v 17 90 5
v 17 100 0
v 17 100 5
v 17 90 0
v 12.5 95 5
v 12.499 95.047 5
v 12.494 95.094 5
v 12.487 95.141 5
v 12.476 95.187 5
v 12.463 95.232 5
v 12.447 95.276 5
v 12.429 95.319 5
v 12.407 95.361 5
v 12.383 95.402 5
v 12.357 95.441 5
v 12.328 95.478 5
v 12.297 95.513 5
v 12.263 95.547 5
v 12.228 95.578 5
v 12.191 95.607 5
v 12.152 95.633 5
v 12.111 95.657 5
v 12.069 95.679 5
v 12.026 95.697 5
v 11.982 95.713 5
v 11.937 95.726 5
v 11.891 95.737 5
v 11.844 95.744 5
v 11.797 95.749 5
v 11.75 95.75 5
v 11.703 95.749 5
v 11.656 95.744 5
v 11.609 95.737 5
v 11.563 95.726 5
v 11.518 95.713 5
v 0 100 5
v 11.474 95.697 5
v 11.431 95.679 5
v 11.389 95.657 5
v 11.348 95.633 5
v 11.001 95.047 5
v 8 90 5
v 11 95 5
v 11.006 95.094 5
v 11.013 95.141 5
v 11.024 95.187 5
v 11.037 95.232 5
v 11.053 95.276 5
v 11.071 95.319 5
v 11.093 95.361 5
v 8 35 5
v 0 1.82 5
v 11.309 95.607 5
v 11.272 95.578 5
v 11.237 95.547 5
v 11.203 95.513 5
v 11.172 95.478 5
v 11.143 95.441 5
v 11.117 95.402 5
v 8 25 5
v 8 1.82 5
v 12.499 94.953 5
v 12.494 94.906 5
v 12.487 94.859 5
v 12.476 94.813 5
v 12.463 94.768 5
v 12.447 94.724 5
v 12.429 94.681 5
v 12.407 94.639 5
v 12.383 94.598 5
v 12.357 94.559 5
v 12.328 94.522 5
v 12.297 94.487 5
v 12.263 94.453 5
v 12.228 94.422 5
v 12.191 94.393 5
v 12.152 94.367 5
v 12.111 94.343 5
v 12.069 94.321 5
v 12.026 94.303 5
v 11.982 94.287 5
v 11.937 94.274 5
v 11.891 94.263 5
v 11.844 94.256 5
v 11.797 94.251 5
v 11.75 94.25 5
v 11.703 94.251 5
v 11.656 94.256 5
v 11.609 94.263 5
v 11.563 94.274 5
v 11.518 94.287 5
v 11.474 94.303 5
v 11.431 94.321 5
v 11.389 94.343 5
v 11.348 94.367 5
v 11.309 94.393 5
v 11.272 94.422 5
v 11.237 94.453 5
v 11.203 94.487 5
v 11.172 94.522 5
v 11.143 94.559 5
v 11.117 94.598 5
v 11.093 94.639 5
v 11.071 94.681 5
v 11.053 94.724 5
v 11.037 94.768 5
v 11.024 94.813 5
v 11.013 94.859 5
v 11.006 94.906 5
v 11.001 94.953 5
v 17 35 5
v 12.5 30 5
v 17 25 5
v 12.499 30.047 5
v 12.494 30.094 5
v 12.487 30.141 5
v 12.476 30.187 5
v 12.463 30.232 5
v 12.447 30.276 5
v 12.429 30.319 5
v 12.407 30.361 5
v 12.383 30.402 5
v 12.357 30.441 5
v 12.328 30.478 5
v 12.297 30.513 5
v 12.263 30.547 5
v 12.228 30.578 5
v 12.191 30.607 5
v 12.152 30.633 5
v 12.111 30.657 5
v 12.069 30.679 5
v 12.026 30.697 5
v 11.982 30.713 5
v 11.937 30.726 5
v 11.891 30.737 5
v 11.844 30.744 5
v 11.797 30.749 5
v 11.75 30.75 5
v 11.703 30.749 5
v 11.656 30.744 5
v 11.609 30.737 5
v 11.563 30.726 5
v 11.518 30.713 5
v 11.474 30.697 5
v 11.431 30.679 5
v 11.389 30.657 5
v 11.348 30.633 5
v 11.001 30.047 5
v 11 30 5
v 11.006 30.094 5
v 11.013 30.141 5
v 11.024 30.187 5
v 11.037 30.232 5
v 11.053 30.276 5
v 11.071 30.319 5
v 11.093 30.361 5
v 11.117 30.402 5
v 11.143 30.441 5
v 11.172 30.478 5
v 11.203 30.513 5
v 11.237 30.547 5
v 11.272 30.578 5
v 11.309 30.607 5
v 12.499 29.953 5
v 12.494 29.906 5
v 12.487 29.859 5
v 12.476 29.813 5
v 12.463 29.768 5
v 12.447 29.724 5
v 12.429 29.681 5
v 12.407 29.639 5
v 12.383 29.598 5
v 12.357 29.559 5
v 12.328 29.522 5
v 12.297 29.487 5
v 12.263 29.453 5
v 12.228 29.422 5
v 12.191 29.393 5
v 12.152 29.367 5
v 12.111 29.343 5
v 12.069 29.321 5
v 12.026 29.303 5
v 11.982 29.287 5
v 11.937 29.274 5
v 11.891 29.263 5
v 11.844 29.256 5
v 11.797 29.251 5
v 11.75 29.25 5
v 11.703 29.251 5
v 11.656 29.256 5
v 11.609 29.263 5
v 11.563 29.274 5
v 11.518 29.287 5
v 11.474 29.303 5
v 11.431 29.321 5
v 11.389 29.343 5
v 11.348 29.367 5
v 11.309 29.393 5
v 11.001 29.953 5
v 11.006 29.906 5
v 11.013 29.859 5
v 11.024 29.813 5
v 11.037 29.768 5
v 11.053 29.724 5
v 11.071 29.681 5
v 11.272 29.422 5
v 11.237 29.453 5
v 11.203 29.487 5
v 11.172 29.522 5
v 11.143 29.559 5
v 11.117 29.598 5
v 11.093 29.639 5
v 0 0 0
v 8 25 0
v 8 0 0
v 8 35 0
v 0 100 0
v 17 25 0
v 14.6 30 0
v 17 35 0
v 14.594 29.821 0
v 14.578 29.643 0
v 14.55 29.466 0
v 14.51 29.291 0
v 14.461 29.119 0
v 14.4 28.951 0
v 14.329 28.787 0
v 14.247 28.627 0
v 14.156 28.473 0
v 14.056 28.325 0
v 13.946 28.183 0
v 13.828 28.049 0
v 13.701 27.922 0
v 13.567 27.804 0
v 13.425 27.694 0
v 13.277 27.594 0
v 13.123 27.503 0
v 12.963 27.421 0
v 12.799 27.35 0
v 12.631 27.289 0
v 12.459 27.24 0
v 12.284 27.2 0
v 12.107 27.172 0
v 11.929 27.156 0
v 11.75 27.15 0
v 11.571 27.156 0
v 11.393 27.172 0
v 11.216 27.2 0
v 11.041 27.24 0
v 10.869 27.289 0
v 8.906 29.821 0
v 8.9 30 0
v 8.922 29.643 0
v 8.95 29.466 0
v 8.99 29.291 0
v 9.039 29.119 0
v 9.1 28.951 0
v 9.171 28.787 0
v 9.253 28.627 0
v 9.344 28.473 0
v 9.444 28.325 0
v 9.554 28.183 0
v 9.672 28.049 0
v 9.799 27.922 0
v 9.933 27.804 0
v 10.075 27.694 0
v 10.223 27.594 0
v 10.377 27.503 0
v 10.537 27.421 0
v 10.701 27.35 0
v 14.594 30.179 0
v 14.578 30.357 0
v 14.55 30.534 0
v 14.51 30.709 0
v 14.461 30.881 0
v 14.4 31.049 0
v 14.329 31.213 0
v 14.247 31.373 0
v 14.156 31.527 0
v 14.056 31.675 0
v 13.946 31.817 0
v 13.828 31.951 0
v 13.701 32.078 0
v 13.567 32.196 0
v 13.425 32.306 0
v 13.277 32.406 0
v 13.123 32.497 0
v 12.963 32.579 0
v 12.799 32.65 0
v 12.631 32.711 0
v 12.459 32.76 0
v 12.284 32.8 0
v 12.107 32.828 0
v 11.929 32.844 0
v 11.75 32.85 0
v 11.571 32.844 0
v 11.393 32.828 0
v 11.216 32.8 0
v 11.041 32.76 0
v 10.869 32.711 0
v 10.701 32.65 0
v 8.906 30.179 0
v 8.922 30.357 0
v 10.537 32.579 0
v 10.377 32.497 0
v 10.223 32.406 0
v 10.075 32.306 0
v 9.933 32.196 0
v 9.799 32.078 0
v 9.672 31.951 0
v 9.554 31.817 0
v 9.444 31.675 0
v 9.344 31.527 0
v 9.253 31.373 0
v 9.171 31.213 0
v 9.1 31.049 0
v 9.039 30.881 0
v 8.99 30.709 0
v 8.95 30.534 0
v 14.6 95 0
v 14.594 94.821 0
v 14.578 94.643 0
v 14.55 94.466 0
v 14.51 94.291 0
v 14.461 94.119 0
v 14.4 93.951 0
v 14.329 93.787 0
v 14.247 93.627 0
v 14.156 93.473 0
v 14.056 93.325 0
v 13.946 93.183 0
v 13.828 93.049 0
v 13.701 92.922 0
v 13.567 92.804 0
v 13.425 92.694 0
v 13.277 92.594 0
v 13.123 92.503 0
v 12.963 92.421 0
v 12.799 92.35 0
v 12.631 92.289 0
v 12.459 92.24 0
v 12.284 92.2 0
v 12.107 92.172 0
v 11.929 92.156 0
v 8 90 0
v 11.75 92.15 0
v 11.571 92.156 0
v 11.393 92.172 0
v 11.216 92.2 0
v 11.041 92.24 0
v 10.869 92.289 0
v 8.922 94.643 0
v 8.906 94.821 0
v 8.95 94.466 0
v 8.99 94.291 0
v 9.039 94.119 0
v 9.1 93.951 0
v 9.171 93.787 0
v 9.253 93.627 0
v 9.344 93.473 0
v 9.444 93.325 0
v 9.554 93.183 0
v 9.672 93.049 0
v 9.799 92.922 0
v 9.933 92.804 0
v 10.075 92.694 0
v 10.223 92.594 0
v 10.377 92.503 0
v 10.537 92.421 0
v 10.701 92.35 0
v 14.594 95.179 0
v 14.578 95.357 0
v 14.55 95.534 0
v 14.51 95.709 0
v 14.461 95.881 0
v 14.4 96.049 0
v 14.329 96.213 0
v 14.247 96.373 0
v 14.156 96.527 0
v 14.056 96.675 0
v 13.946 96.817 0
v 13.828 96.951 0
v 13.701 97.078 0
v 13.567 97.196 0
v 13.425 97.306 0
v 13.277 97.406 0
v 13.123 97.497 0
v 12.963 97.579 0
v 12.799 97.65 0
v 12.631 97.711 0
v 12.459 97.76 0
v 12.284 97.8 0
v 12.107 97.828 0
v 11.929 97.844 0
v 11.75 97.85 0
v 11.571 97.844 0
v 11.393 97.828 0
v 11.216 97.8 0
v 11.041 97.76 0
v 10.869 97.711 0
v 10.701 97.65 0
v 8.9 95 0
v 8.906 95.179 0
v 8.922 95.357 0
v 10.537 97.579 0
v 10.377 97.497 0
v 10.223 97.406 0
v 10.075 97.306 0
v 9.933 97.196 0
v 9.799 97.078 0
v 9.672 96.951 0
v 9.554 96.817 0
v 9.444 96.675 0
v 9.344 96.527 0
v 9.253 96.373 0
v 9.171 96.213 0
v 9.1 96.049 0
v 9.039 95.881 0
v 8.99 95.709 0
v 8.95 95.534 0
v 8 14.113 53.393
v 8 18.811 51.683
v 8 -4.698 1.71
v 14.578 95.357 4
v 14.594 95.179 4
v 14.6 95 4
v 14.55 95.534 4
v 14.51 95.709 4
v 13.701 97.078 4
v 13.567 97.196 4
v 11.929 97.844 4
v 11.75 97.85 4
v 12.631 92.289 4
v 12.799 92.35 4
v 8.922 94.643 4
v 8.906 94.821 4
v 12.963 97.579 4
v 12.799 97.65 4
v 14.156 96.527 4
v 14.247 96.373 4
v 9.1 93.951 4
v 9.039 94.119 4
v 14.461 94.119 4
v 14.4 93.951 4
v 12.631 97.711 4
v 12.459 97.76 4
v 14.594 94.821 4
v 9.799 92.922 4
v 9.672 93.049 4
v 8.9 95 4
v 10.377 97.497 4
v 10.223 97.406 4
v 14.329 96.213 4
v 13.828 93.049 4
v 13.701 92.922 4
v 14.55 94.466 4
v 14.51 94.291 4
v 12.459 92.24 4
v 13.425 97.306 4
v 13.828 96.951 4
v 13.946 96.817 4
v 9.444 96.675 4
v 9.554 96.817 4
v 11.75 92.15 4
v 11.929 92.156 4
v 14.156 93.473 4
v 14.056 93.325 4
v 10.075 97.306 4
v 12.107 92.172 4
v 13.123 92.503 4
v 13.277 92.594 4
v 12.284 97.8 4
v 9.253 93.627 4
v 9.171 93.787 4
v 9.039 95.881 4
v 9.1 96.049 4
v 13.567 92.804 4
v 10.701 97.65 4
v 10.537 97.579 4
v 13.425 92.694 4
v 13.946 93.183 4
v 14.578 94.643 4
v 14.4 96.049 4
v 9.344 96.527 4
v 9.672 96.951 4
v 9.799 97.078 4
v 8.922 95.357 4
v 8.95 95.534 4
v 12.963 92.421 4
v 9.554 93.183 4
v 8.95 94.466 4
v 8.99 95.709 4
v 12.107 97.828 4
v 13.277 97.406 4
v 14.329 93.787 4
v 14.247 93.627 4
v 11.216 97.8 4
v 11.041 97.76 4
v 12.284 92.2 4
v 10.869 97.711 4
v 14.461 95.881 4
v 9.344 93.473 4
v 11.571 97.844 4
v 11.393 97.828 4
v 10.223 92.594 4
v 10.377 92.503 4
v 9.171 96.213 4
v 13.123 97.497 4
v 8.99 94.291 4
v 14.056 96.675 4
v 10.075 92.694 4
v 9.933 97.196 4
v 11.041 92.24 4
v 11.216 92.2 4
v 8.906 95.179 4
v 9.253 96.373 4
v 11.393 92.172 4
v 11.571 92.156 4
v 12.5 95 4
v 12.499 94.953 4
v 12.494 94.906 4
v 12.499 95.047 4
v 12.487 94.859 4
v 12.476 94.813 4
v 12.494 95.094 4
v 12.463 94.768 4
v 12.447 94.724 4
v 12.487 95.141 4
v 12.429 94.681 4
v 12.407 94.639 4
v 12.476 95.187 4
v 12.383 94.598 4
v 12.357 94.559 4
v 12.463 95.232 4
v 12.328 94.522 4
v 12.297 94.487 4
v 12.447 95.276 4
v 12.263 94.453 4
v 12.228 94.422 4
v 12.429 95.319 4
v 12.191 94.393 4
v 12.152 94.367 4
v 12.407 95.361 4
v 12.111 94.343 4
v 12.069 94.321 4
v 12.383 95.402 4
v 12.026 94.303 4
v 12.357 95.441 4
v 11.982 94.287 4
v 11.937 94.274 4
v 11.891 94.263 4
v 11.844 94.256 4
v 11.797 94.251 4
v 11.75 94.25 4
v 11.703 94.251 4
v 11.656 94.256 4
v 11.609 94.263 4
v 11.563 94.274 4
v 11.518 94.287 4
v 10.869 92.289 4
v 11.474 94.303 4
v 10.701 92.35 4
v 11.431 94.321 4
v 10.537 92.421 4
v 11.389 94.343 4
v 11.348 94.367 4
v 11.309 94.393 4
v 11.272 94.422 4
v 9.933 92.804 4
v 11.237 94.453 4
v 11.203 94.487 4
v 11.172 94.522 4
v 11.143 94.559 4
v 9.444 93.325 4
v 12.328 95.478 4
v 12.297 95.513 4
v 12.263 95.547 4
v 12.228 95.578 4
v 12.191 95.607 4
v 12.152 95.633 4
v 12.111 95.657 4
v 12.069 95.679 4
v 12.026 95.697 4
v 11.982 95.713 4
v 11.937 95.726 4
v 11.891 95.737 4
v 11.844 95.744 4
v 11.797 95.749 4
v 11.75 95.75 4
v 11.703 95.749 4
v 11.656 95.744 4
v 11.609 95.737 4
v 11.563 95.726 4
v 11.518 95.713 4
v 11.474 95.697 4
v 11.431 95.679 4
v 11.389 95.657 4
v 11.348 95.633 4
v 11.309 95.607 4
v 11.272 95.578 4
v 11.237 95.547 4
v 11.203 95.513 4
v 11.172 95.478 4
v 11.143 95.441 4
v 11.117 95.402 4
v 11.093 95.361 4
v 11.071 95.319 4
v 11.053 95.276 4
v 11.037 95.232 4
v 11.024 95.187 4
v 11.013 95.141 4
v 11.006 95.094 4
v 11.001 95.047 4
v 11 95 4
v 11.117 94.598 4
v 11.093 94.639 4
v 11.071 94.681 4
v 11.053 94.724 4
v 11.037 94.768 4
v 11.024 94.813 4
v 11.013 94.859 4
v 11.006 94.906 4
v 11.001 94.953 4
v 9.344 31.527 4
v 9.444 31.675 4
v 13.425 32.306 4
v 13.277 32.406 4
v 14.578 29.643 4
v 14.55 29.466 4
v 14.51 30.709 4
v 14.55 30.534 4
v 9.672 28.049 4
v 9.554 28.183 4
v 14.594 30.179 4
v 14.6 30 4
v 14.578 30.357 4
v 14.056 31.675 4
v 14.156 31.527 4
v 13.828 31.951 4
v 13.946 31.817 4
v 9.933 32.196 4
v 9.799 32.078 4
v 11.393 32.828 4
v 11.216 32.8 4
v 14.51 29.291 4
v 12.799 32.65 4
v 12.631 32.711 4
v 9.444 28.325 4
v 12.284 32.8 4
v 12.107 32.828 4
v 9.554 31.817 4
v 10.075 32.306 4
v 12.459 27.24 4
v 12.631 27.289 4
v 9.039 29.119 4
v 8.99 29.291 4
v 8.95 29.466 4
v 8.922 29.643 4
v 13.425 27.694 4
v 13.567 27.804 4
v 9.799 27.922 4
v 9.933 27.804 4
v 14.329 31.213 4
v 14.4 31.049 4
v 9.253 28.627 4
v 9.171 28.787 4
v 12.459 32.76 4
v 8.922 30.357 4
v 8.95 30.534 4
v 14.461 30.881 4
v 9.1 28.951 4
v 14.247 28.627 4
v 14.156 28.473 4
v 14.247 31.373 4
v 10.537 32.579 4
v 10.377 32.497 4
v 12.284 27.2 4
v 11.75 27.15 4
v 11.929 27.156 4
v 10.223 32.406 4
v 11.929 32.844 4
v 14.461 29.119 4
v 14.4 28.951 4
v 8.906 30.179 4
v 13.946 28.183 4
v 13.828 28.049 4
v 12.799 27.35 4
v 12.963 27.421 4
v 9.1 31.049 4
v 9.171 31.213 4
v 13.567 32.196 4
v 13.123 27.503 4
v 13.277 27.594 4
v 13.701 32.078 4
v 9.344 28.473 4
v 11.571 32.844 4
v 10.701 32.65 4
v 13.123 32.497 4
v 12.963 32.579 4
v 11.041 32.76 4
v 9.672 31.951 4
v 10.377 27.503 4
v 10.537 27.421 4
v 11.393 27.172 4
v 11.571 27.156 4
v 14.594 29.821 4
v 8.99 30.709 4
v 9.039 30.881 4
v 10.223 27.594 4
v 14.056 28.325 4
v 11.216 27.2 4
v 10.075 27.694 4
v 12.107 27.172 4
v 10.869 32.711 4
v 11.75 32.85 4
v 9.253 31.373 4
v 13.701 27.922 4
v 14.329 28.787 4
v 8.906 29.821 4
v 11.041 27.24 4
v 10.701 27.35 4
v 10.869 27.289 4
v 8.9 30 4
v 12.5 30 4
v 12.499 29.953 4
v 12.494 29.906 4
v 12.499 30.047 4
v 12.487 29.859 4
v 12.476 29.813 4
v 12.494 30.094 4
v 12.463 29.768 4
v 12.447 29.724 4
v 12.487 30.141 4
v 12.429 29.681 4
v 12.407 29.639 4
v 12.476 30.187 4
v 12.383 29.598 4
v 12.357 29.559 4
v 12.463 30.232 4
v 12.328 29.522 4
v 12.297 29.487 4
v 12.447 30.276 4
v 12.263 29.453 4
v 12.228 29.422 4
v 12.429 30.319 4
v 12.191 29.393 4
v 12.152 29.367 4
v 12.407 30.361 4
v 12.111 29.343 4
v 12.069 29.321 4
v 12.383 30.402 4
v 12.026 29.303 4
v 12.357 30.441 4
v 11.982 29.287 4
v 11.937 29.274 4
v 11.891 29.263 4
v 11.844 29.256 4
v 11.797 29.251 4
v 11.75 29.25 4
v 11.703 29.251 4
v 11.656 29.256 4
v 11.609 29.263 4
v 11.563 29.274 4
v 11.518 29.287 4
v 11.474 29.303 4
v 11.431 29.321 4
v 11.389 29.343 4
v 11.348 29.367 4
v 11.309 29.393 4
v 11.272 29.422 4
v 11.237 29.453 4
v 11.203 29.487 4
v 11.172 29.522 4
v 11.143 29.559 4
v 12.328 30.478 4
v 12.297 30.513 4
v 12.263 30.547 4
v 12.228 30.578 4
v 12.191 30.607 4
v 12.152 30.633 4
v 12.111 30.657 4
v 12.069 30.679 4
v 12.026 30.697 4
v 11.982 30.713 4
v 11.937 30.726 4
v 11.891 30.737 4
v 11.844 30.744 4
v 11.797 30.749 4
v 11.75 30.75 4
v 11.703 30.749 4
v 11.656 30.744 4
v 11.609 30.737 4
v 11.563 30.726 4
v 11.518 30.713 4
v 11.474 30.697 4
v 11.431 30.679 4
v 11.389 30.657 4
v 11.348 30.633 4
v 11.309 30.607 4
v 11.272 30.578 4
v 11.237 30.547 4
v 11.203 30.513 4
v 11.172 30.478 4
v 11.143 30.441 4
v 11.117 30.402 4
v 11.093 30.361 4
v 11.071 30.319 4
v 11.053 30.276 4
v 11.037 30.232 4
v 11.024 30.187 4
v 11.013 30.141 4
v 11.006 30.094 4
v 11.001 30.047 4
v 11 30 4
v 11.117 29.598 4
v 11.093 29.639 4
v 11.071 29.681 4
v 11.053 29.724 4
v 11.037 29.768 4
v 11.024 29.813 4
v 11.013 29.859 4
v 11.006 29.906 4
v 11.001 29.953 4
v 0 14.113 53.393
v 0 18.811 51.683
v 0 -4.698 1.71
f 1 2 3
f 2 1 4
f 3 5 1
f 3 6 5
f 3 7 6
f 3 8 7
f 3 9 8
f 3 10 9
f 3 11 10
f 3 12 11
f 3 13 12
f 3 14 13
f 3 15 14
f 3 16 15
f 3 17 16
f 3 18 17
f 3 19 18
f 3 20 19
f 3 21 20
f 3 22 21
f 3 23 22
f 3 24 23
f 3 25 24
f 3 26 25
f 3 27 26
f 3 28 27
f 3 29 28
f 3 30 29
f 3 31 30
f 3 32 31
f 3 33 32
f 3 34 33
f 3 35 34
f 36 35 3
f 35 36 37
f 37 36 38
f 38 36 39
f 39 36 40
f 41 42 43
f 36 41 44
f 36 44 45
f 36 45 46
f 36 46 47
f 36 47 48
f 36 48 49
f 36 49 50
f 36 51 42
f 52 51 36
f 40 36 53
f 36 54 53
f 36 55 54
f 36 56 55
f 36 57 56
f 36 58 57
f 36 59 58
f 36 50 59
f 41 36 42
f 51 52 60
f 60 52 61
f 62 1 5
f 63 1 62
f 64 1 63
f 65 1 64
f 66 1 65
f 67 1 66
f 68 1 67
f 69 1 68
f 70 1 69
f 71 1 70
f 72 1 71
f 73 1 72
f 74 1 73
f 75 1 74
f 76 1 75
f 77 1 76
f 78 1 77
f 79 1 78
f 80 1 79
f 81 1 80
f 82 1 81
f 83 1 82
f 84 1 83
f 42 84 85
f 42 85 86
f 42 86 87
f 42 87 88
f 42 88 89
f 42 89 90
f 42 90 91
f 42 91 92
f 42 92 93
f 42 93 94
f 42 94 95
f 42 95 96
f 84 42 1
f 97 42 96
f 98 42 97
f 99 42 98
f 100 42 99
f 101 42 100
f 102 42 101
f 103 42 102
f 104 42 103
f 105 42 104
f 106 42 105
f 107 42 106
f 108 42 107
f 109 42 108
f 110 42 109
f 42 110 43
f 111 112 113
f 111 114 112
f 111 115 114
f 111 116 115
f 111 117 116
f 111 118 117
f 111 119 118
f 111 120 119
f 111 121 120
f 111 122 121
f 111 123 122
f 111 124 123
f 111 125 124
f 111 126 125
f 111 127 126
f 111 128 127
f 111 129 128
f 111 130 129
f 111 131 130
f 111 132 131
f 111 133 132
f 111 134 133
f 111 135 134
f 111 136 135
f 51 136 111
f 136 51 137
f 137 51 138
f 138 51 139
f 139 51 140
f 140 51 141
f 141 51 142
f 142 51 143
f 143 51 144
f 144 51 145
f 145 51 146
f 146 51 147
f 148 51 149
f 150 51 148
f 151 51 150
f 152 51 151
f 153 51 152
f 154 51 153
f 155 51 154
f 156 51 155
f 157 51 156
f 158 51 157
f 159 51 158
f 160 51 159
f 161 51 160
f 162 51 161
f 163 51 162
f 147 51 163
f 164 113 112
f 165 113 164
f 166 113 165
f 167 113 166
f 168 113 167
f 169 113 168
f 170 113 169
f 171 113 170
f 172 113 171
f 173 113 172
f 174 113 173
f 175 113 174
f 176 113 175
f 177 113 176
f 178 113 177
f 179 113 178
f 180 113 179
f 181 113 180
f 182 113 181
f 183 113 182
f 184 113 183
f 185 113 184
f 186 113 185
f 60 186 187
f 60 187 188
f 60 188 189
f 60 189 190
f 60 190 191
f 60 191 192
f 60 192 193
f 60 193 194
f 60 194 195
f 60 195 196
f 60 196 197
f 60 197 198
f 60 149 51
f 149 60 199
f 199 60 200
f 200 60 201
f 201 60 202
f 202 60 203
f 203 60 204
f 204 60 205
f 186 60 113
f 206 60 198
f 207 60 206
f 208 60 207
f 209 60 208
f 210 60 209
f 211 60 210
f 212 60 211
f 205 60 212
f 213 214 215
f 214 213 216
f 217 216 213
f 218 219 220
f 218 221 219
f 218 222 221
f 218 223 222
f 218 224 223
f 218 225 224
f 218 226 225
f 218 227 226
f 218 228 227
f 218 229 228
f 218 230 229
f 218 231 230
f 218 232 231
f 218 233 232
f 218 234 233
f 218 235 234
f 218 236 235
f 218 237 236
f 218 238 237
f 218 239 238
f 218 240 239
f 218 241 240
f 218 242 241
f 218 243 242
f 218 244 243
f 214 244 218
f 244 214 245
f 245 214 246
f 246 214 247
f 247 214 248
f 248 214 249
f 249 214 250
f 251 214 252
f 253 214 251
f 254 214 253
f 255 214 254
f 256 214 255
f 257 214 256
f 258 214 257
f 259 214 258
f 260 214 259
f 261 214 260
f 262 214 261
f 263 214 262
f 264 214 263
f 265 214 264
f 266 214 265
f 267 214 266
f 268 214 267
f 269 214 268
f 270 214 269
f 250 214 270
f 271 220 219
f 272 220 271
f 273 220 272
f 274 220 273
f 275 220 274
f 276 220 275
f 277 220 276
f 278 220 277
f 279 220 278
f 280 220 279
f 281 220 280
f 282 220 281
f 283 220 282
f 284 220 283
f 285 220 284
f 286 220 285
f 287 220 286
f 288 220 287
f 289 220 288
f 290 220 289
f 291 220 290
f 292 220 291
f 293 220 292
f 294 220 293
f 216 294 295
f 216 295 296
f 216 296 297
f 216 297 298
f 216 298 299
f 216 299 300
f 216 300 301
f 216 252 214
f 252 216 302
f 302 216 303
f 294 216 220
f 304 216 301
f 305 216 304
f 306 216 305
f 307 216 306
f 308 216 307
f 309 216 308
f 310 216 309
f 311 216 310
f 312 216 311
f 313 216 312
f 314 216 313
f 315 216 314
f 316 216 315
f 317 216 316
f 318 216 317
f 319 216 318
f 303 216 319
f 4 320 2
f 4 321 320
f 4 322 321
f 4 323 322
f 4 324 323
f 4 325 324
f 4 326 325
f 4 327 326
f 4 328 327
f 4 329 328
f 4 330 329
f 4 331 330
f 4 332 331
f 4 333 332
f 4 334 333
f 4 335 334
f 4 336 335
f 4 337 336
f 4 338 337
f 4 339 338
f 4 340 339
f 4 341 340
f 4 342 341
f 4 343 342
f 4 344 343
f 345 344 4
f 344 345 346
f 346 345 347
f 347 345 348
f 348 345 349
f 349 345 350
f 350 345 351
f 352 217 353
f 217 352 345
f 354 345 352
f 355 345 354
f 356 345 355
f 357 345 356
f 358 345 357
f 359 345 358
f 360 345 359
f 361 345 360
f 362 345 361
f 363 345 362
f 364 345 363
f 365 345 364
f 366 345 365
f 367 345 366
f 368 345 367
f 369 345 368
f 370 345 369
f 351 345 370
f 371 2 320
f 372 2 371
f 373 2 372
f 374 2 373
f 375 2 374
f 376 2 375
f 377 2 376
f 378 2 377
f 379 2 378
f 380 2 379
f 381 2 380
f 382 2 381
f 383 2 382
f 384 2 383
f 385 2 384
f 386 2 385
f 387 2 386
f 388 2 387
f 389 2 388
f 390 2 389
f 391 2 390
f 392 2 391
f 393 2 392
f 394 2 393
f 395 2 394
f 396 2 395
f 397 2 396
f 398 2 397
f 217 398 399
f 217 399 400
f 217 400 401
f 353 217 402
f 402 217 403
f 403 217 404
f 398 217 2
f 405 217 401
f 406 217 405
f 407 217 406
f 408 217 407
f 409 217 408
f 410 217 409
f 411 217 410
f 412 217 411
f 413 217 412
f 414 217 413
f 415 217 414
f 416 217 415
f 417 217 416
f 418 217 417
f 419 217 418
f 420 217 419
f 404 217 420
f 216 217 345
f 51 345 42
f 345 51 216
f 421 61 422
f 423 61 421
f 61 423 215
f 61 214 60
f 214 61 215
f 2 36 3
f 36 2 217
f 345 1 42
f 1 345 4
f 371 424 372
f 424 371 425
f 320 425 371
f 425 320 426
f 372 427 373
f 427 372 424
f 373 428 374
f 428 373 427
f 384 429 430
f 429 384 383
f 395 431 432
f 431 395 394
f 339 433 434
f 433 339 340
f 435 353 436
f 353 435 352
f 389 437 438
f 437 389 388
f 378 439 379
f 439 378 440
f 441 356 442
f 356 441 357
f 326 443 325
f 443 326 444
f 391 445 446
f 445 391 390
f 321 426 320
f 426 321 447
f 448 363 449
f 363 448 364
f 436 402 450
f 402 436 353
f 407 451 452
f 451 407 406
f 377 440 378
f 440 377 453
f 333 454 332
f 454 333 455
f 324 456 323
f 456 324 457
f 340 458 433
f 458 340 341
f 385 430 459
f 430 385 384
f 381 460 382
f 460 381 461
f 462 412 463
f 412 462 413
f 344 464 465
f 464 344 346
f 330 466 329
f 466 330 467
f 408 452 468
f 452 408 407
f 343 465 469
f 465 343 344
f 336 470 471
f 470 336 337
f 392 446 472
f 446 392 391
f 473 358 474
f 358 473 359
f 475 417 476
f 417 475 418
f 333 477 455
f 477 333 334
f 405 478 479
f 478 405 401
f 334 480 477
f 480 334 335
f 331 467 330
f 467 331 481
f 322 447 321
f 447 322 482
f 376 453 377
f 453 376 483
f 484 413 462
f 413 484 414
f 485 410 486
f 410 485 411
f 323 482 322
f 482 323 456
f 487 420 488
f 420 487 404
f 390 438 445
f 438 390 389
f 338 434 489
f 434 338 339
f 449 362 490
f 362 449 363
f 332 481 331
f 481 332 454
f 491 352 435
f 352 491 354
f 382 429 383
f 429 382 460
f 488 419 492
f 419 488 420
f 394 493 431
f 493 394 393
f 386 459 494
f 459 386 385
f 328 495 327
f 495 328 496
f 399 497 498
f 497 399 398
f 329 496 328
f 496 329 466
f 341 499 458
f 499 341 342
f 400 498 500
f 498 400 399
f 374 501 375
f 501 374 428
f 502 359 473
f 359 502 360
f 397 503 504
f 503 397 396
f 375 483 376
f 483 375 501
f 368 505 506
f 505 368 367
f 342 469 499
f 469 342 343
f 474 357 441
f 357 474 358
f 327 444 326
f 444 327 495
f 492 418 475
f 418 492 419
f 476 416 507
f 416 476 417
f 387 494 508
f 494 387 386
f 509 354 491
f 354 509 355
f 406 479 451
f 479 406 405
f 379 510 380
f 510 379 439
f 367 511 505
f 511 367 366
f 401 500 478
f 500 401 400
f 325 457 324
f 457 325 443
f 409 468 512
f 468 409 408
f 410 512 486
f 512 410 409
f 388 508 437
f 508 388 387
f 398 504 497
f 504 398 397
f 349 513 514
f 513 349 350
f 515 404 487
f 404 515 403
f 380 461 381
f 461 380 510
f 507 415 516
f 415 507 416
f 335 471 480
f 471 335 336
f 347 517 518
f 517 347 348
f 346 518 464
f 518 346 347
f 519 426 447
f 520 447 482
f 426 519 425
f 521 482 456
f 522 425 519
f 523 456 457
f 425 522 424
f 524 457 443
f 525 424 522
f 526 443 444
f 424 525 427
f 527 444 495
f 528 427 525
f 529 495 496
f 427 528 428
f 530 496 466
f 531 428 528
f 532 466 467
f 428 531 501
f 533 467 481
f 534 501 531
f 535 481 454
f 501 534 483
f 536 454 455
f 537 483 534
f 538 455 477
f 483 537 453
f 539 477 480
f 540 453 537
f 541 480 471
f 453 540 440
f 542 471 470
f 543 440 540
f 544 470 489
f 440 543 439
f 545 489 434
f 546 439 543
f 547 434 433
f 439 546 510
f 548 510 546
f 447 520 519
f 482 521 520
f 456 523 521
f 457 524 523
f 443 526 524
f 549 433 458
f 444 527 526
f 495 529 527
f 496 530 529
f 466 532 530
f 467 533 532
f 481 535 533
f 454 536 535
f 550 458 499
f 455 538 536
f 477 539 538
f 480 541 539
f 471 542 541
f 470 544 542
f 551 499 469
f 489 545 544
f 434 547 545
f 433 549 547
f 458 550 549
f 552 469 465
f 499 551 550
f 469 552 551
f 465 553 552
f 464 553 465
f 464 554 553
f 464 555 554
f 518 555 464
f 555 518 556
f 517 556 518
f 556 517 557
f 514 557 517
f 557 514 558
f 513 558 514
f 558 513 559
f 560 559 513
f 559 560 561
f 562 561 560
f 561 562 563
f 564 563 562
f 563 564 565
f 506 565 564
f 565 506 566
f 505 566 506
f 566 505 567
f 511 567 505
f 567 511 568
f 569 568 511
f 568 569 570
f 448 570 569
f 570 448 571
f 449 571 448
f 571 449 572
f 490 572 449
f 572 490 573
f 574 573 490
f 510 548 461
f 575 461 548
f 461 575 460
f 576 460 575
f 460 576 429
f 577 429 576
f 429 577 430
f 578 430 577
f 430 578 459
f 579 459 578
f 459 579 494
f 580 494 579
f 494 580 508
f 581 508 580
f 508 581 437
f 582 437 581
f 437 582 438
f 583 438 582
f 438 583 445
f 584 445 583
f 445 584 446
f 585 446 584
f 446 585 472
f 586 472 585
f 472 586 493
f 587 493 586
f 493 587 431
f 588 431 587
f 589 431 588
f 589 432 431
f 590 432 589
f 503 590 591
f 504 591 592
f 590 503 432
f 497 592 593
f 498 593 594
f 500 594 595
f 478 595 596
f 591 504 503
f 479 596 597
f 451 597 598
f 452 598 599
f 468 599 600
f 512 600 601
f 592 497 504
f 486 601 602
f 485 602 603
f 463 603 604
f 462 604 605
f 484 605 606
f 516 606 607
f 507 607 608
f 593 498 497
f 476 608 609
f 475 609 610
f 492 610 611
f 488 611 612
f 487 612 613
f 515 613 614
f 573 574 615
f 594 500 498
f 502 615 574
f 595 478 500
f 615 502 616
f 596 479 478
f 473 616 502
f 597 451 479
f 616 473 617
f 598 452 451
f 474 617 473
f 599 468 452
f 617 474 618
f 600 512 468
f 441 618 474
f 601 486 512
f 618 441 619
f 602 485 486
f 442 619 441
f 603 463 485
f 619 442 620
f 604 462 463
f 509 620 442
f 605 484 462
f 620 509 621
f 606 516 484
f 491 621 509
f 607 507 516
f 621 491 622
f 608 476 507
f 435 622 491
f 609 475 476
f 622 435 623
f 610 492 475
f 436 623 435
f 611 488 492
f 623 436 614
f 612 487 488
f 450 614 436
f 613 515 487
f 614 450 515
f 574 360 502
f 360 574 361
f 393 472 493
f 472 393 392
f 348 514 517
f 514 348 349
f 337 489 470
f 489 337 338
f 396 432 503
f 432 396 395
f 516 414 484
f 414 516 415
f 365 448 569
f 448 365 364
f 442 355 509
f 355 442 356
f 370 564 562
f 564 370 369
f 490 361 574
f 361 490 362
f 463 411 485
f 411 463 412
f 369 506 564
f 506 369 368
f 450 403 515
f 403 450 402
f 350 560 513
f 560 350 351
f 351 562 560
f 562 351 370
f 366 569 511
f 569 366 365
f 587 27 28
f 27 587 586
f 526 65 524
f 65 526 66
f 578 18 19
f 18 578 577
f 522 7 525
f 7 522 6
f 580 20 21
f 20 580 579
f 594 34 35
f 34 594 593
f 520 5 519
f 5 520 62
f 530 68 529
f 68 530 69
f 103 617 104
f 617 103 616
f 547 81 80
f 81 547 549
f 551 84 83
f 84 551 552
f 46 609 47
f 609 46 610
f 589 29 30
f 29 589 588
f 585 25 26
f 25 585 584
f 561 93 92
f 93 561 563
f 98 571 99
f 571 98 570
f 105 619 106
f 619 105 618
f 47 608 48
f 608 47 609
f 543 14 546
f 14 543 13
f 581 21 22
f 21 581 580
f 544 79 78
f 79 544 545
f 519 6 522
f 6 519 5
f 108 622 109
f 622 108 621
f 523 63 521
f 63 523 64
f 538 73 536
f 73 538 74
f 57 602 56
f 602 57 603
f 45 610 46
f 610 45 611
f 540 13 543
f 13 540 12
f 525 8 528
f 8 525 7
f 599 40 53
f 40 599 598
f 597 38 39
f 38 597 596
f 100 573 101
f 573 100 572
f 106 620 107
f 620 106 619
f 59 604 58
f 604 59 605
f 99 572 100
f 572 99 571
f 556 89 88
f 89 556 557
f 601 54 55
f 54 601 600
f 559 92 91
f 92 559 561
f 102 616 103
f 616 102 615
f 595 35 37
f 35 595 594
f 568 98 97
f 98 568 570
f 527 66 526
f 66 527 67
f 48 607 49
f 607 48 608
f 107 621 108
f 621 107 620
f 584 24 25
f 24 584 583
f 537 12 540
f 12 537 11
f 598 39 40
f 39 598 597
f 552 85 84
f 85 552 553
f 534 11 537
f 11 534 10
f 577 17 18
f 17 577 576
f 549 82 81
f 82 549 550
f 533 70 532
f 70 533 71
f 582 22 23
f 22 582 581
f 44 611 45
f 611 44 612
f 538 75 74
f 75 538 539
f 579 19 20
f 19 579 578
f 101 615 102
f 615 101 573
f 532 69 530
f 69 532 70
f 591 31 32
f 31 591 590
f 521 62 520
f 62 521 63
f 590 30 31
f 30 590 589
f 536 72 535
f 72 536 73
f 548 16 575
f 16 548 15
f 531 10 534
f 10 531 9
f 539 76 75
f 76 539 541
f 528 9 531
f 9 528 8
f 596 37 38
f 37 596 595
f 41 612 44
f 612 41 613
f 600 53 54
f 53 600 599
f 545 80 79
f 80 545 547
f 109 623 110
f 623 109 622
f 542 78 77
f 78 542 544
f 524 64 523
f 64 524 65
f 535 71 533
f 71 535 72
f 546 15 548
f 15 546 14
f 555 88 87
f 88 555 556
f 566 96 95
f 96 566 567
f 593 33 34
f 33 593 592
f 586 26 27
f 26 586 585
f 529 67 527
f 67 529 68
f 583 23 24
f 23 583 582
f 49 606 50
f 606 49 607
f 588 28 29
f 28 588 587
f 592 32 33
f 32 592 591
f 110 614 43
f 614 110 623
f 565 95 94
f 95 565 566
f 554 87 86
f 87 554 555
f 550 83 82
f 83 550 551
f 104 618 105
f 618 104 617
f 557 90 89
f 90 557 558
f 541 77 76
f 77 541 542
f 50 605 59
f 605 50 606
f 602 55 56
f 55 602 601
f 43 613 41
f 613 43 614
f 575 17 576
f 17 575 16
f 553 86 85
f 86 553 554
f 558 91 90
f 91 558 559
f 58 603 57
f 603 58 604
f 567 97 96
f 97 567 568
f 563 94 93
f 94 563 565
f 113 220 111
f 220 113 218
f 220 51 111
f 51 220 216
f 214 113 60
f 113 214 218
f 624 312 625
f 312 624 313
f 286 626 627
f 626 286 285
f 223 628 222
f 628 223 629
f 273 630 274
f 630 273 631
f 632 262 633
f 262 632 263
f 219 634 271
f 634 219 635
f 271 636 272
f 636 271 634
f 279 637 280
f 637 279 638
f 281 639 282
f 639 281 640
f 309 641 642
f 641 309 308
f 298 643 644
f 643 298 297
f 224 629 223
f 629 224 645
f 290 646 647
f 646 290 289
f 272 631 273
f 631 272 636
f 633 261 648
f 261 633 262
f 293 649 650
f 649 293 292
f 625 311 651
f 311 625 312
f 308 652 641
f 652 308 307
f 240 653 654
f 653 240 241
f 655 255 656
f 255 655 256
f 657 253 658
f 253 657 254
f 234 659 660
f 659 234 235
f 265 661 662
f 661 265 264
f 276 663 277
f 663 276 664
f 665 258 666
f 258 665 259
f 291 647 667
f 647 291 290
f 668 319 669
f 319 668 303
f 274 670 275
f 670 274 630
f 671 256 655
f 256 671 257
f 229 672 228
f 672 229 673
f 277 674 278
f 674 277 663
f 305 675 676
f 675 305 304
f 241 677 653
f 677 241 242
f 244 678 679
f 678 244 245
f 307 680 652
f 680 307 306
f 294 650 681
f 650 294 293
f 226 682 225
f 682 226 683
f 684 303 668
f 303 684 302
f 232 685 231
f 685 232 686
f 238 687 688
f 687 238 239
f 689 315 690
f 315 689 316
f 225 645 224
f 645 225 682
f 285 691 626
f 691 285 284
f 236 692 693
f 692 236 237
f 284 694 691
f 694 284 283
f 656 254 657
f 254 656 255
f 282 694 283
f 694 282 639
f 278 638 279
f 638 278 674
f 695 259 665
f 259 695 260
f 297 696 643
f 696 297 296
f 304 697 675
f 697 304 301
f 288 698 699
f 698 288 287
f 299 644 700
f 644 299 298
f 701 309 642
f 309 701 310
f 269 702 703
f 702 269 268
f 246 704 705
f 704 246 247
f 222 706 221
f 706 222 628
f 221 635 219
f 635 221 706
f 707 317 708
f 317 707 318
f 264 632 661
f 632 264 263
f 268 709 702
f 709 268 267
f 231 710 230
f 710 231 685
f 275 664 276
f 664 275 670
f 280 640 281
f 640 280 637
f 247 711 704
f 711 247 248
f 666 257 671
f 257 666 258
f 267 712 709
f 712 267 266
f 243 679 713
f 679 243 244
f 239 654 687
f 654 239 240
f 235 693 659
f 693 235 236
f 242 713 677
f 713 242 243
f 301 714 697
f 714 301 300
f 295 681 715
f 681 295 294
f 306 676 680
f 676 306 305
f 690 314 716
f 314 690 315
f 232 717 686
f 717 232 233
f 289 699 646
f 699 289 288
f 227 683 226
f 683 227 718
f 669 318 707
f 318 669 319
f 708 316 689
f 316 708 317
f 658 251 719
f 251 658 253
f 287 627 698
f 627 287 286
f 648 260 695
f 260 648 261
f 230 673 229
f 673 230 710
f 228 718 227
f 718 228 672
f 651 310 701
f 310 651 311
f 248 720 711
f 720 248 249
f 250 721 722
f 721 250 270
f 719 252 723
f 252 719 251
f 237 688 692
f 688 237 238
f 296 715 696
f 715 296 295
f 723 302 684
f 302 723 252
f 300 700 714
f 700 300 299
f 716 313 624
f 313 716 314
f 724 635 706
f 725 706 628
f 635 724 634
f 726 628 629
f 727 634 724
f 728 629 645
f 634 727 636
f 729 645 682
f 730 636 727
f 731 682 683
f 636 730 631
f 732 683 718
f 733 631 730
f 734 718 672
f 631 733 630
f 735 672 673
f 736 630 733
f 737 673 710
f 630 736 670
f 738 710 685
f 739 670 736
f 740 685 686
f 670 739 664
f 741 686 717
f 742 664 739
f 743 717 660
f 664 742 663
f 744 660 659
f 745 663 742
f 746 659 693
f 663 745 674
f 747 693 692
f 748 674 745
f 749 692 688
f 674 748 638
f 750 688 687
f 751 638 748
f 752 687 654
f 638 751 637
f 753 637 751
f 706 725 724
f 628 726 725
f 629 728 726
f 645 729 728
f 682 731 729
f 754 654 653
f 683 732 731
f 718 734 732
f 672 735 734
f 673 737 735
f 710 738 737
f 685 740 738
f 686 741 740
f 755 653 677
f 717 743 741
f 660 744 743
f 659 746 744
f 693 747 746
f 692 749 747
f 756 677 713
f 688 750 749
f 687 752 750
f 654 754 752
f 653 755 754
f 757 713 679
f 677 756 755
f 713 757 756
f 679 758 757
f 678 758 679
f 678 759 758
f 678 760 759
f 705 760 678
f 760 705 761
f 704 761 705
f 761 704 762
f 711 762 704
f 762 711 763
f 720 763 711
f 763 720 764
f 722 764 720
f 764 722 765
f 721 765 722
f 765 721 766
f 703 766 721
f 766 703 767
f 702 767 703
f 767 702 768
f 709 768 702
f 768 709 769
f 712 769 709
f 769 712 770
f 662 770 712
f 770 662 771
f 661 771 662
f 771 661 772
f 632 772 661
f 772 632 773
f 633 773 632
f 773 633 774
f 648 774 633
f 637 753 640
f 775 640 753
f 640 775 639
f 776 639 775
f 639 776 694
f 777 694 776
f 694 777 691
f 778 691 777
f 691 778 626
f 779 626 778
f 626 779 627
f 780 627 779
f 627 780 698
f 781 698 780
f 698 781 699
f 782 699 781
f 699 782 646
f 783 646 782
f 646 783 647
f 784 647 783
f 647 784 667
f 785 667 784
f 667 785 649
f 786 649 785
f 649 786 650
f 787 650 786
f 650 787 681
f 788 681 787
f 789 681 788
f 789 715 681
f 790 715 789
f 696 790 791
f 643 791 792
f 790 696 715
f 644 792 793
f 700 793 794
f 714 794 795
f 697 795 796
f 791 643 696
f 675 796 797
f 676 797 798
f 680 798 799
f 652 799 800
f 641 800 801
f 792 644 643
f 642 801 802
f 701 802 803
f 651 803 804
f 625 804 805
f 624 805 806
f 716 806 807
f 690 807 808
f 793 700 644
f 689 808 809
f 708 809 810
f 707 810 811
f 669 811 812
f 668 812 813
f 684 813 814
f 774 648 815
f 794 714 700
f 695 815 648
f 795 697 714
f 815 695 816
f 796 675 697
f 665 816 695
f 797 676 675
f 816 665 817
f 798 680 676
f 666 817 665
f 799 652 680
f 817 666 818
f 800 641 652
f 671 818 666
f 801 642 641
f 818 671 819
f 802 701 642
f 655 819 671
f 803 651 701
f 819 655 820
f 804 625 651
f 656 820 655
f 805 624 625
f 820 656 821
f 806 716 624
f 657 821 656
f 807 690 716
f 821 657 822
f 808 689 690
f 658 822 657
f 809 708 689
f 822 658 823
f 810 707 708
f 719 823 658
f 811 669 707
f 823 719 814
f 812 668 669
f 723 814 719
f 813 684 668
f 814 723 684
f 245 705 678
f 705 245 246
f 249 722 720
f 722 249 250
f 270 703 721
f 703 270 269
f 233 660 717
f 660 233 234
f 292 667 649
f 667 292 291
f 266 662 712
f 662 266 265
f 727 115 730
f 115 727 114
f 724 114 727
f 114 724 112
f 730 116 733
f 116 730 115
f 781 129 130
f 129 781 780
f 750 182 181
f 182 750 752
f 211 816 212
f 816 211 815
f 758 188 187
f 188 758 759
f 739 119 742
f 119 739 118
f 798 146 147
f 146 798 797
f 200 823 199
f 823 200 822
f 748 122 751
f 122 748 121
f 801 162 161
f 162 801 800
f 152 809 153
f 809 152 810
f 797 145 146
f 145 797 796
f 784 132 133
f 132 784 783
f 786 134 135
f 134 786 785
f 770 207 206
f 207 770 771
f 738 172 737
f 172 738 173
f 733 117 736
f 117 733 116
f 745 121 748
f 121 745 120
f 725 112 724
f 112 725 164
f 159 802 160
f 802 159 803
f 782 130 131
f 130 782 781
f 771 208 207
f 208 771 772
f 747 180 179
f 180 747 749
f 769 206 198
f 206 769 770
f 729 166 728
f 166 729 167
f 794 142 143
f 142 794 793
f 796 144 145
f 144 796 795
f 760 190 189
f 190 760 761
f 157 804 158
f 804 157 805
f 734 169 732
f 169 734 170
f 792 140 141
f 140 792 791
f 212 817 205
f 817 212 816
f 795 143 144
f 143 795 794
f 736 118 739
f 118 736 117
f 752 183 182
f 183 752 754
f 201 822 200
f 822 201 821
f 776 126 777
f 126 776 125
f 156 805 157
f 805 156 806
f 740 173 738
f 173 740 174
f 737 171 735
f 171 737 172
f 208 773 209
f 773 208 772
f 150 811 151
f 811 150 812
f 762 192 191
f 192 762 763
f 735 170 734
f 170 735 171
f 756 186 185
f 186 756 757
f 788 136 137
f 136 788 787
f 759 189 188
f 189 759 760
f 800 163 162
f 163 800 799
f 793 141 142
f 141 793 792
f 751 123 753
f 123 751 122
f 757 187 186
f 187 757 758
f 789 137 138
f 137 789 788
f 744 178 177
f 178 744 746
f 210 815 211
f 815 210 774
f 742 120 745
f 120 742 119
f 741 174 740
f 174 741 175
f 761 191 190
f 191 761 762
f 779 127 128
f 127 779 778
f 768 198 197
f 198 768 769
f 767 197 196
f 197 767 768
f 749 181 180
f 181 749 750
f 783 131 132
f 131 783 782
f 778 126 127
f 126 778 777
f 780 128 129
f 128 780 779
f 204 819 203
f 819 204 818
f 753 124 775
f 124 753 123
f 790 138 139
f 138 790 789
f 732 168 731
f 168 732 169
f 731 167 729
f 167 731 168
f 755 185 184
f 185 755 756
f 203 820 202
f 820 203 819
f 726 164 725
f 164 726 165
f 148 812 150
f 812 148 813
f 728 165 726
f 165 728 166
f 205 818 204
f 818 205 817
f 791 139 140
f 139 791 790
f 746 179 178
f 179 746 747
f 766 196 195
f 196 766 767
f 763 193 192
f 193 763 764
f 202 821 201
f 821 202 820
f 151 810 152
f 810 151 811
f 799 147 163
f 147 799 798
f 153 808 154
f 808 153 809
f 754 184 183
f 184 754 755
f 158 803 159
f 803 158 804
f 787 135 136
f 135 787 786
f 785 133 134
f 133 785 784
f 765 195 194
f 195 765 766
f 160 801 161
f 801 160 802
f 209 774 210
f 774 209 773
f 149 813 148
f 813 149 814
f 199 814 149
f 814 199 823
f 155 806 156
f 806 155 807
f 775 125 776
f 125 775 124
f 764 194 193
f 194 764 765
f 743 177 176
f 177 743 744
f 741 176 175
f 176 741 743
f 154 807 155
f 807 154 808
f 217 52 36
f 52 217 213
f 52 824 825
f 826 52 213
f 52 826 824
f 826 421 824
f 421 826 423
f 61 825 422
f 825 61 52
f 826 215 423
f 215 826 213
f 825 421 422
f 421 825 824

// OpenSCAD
$fs=0.01;
$fn=100;

//0=left piece, 1=right piece
mirror_part = 0; //[0, 1]

main_rod_length = 100; //[90:130]
main_rod_width = 8; //[8:15]
main_rod_height = 5; //[5:10]
screw_outside_diameter = 5.7;
screw_outside_height = 4;
screw_hole_diameter = 1.5;

support_rod_length = 55; //[50:80]
support_rod_width = main_rod_width;
support_rod_height = main_rod_height;
support_rod_angle = 70; //[45:90]

mirror([mirror_part,0,0])
union() {
    //main rod
    cube([main_rod_width,main_rod_length,main_rod_height], center=false);

    //top screw
    difference(){
        translate([main_rod_width,main_rod_length-10,0]){
            cube([9,10,main_rod_height], center=false);
        }
        translate([main_rod_width+7.5/2,main_rod_length-10+5,-1]){
            color("red") cylinder(h=screw_outside_height+1,d=screw_outside_diameter ,center=false);
        }
        translate([main_rod_width+7.5/2,main_rod_length-10+5,-1]){
            color("red") cylinder(h=main_rod_height+2,d=screw_hole_diameter,center=false);
        }
    }

    //bottom screw
    difference(){
        translate([main_rod_width,main_rod_length-10-65,0]){
            cube([9,10,main_rod_height], center=false);
        }
        translate([main_rod_width+7.5/2,main_rod_length-10-65+5,-1]){
            color("red") cylinder(h=screw_outside_height+1,d=screw_outside_diameter,center=false);
        }
        translate([main_rod_width+7.5/2,main_rod_length-10-65+5,-1]){
            color("red") cylinder(h=main_rod_height+2,d=screw_hole_diameter,center=false);
        }
    }

    //desk support rod
    rotate([support_rod_angle,0,0]) cube([support_rod_width,support_rod_length,support_rod_height], center=false);

}
